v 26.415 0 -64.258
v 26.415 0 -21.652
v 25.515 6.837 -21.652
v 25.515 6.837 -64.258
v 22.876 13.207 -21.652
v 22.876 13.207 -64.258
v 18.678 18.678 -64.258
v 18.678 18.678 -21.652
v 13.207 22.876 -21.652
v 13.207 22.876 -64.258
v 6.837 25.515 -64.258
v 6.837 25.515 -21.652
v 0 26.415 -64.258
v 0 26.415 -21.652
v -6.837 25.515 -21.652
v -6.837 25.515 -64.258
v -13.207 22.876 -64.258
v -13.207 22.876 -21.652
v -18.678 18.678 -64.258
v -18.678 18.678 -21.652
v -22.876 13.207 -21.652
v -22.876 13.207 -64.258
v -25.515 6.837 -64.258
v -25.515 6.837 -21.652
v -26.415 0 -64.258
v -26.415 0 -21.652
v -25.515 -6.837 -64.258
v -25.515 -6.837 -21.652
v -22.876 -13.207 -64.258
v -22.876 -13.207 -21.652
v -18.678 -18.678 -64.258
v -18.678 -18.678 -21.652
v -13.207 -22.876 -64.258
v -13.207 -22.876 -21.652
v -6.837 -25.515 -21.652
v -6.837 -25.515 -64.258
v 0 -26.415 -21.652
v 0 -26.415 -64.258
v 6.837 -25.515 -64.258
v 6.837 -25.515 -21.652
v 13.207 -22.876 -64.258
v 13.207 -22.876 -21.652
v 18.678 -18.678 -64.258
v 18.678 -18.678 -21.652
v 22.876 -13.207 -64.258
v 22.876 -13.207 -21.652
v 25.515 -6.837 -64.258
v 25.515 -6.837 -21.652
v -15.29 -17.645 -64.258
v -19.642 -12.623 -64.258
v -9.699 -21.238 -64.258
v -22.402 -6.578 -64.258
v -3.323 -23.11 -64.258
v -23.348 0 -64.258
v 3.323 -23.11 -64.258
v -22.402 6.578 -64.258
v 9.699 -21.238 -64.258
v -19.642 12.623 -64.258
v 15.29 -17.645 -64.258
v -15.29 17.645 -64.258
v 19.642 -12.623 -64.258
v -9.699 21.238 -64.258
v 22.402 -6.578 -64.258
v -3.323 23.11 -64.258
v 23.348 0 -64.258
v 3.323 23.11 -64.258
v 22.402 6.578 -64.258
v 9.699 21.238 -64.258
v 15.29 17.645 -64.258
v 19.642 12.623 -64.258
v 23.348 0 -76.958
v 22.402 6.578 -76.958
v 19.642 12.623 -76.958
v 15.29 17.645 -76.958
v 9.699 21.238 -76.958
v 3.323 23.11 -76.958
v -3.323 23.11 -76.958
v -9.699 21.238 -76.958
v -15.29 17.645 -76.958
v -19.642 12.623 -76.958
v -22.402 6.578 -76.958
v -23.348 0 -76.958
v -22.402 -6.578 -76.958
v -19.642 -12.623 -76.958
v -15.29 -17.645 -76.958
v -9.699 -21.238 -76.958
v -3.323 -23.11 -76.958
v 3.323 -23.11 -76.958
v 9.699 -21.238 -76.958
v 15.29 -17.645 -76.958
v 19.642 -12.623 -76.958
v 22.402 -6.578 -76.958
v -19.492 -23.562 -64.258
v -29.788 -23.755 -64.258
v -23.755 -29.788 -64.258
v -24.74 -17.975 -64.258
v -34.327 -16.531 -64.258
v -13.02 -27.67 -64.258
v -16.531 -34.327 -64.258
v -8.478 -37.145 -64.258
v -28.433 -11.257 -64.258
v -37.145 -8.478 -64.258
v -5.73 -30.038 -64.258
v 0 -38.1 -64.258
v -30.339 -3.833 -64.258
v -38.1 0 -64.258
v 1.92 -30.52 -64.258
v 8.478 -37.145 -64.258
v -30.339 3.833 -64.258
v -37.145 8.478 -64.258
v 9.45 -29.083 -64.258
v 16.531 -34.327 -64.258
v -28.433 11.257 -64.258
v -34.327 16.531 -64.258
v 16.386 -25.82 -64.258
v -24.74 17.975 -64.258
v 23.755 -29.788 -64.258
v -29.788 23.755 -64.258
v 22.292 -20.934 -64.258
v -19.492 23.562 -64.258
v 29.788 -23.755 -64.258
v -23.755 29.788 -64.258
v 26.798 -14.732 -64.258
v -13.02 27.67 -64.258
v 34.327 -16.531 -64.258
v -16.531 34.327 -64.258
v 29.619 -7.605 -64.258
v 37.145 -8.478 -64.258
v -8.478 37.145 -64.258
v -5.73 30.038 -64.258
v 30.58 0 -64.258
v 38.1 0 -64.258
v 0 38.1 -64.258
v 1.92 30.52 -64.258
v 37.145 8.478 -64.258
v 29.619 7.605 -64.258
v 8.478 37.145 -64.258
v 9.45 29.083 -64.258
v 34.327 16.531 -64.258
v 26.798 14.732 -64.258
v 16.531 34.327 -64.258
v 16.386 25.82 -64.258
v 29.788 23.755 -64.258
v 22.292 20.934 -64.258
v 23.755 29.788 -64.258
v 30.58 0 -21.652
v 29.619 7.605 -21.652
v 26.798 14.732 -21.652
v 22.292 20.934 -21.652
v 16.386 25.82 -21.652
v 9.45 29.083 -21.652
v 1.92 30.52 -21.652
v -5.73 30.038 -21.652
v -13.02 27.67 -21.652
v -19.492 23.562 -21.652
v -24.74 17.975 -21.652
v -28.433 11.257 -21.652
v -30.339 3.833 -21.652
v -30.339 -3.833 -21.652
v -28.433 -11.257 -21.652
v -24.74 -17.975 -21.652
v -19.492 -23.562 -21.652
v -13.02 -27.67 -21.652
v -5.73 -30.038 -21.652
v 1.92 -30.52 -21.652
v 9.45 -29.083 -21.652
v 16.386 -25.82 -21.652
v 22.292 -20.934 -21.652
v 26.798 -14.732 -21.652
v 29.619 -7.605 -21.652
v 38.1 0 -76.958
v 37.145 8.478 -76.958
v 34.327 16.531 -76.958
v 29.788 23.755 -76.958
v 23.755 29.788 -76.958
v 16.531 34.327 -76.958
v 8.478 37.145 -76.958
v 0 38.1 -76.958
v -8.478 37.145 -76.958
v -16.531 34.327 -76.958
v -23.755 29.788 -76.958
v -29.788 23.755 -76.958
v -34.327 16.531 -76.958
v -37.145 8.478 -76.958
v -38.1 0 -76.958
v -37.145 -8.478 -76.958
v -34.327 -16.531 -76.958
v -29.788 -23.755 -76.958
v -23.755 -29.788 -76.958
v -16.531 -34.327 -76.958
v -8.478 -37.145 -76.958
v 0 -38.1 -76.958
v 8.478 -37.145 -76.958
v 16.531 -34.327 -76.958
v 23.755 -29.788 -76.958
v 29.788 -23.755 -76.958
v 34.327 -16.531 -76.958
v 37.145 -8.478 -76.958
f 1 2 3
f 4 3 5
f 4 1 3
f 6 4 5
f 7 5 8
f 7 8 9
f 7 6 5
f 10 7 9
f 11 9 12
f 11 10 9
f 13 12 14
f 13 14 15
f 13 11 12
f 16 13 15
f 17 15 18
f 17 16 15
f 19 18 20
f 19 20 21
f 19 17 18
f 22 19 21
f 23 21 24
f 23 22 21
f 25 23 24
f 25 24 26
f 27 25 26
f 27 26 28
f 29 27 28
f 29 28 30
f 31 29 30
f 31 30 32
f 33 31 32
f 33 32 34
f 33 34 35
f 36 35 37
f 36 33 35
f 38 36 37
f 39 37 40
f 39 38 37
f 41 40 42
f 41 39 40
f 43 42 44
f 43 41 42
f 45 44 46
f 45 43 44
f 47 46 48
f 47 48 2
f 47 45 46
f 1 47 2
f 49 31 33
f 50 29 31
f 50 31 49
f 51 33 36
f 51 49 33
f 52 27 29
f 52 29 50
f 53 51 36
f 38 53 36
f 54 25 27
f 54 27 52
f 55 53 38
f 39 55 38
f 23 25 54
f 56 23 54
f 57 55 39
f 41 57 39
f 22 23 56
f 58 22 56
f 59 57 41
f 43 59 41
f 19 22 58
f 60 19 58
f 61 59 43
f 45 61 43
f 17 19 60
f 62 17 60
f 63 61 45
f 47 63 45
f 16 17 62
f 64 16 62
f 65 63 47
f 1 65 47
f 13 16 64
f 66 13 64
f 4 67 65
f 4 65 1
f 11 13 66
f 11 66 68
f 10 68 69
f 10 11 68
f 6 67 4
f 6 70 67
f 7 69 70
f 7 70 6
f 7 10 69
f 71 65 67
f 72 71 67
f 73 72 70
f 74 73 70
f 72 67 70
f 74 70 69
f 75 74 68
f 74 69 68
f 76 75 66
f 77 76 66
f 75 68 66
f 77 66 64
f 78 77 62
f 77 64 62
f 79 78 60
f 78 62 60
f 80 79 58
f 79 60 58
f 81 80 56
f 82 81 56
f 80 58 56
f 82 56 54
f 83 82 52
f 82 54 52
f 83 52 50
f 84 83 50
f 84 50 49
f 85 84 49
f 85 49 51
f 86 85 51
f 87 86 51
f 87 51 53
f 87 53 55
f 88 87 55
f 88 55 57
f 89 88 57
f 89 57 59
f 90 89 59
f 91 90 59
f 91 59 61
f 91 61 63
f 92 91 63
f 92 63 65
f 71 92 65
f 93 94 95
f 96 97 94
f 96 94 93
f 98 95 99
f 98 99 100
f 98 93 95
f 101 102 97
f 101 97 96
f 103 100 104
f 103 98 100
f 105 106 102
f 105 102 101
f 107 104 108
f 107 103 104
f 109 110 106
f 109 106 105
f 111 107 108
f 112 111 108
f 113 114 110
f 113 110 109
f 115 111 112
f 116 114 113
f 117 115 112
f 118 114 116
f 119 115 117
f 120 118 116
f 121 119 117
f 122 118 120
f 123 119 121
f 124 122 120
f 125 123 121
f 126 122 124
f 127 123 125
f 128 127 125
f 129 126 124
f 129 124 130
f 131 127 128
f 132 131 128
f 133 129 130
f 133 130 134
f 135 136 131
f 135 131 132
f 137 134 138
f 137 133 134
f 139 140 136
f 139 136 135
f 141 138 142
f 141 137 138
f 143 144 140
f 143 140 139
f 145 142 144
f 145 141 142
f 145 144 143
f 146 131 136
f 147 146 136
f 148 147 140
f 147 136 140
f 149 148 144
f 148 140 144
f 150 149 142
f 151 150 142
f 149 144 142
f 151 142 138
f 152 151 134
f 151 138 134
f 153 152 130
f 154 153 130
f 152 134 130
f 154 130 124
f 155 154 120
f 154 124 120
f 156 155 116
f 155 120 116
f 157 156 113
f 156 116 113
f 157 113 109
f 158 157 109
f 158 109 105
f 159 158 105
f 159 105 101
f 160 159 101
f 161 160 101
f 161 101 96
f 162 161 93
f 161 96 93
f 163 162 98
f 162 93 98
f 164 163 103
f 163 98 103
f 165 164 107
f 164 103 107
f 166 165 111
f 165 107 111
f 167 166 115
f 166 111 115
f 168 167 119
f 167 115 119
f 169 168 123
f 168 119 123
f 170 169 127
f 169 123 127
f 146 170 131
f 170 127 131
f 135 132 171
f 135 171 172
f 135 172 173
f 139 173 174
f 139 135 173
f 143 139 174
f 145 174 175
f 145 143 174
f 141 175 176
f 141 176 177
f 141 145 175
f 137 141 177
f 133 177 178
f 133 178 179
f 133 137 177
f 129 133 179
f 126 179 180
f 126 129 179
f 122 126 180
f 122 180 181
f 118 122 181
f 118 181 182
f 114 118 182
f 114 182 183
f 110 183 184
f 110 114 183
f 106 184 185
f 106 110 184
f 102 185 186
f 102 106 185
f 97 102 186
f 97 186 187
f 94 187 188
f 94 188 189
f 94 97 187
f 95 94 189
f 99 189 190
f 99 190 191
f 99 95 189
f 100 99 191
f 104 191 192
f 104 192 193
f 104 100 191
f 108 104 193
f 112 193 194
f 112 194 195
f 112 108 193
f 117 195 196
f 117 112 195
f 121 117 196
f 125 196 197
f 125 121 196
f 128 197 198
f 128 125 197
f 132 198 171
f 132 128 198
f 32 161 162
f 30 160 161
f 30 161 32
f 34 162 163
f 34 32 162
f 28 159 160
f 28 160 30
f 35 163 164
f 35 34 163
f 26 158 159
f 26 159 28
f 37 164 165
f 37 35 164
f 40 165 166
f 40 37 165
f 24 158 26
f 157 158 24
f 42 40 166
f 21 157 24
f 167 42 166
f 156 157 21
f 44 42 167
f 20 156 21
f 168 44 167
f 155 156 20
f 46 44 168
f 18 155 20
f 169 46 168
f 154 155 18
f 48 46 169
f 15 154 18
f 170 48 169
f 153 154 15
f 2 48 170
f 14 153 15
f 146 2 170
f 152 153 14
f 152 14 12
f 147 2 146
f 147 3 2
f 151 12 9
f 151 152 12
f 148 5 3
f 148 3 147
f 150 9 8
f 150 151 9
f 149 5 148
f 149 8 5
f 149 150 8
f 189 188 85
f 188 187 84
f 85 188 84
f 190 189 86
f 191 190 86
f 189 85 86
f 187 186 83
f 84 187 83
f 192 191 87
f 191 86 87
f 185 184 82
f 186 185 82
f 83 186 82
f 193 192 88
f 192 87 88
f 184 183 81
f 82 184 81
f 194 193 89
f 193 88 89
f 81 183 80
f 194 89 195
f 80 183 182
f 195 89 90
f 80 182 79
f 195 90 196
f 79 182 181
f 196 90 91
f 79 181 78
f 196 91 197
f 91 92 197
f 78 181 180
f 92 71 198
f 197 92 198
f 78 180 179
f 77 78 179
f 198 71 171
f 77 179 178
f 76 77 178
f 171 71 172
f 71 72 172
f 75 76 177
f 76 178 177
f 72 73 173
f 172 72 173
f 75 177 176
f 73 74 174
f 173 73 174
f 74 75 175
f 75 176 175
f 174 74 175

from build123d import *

# Parameters (mm, degrees)
F1_R     = 30.580116
F1_R_2   = 26.414557
F2_DEPTH = 42.605285
F3_R     = 38.1
F4_DEPTH = 12.7
F5_R     = 23.348027
F6_DEPTH = 25.4


with BuildPart() as f2:
    # F1 (on offset) → F2 (new body)
    with BuildSketch(Plane.XY.offset(-64.257657)):
        Circle(F1_R)
        Circle(F1_R_2, mode=Mode.SUBTRACT)
    extrude(amount=F2_DEPTH)

    # F3 (on offset) → F4 (join)
    with BuildSketch(Plane.XY.offset(-64.257657)):
        Circle(F3_R)
    extrude(amount=-F4_DEPTH)

    # F5 (on face) → F6 (cut)
    with BuildSketch(Plane.XY.offset(-64.257657)):
        Circle(F5_R)
    extrude(amount=-F6_DEPTH, mode=Mode.SUBTRACT)


solid = f2.part
